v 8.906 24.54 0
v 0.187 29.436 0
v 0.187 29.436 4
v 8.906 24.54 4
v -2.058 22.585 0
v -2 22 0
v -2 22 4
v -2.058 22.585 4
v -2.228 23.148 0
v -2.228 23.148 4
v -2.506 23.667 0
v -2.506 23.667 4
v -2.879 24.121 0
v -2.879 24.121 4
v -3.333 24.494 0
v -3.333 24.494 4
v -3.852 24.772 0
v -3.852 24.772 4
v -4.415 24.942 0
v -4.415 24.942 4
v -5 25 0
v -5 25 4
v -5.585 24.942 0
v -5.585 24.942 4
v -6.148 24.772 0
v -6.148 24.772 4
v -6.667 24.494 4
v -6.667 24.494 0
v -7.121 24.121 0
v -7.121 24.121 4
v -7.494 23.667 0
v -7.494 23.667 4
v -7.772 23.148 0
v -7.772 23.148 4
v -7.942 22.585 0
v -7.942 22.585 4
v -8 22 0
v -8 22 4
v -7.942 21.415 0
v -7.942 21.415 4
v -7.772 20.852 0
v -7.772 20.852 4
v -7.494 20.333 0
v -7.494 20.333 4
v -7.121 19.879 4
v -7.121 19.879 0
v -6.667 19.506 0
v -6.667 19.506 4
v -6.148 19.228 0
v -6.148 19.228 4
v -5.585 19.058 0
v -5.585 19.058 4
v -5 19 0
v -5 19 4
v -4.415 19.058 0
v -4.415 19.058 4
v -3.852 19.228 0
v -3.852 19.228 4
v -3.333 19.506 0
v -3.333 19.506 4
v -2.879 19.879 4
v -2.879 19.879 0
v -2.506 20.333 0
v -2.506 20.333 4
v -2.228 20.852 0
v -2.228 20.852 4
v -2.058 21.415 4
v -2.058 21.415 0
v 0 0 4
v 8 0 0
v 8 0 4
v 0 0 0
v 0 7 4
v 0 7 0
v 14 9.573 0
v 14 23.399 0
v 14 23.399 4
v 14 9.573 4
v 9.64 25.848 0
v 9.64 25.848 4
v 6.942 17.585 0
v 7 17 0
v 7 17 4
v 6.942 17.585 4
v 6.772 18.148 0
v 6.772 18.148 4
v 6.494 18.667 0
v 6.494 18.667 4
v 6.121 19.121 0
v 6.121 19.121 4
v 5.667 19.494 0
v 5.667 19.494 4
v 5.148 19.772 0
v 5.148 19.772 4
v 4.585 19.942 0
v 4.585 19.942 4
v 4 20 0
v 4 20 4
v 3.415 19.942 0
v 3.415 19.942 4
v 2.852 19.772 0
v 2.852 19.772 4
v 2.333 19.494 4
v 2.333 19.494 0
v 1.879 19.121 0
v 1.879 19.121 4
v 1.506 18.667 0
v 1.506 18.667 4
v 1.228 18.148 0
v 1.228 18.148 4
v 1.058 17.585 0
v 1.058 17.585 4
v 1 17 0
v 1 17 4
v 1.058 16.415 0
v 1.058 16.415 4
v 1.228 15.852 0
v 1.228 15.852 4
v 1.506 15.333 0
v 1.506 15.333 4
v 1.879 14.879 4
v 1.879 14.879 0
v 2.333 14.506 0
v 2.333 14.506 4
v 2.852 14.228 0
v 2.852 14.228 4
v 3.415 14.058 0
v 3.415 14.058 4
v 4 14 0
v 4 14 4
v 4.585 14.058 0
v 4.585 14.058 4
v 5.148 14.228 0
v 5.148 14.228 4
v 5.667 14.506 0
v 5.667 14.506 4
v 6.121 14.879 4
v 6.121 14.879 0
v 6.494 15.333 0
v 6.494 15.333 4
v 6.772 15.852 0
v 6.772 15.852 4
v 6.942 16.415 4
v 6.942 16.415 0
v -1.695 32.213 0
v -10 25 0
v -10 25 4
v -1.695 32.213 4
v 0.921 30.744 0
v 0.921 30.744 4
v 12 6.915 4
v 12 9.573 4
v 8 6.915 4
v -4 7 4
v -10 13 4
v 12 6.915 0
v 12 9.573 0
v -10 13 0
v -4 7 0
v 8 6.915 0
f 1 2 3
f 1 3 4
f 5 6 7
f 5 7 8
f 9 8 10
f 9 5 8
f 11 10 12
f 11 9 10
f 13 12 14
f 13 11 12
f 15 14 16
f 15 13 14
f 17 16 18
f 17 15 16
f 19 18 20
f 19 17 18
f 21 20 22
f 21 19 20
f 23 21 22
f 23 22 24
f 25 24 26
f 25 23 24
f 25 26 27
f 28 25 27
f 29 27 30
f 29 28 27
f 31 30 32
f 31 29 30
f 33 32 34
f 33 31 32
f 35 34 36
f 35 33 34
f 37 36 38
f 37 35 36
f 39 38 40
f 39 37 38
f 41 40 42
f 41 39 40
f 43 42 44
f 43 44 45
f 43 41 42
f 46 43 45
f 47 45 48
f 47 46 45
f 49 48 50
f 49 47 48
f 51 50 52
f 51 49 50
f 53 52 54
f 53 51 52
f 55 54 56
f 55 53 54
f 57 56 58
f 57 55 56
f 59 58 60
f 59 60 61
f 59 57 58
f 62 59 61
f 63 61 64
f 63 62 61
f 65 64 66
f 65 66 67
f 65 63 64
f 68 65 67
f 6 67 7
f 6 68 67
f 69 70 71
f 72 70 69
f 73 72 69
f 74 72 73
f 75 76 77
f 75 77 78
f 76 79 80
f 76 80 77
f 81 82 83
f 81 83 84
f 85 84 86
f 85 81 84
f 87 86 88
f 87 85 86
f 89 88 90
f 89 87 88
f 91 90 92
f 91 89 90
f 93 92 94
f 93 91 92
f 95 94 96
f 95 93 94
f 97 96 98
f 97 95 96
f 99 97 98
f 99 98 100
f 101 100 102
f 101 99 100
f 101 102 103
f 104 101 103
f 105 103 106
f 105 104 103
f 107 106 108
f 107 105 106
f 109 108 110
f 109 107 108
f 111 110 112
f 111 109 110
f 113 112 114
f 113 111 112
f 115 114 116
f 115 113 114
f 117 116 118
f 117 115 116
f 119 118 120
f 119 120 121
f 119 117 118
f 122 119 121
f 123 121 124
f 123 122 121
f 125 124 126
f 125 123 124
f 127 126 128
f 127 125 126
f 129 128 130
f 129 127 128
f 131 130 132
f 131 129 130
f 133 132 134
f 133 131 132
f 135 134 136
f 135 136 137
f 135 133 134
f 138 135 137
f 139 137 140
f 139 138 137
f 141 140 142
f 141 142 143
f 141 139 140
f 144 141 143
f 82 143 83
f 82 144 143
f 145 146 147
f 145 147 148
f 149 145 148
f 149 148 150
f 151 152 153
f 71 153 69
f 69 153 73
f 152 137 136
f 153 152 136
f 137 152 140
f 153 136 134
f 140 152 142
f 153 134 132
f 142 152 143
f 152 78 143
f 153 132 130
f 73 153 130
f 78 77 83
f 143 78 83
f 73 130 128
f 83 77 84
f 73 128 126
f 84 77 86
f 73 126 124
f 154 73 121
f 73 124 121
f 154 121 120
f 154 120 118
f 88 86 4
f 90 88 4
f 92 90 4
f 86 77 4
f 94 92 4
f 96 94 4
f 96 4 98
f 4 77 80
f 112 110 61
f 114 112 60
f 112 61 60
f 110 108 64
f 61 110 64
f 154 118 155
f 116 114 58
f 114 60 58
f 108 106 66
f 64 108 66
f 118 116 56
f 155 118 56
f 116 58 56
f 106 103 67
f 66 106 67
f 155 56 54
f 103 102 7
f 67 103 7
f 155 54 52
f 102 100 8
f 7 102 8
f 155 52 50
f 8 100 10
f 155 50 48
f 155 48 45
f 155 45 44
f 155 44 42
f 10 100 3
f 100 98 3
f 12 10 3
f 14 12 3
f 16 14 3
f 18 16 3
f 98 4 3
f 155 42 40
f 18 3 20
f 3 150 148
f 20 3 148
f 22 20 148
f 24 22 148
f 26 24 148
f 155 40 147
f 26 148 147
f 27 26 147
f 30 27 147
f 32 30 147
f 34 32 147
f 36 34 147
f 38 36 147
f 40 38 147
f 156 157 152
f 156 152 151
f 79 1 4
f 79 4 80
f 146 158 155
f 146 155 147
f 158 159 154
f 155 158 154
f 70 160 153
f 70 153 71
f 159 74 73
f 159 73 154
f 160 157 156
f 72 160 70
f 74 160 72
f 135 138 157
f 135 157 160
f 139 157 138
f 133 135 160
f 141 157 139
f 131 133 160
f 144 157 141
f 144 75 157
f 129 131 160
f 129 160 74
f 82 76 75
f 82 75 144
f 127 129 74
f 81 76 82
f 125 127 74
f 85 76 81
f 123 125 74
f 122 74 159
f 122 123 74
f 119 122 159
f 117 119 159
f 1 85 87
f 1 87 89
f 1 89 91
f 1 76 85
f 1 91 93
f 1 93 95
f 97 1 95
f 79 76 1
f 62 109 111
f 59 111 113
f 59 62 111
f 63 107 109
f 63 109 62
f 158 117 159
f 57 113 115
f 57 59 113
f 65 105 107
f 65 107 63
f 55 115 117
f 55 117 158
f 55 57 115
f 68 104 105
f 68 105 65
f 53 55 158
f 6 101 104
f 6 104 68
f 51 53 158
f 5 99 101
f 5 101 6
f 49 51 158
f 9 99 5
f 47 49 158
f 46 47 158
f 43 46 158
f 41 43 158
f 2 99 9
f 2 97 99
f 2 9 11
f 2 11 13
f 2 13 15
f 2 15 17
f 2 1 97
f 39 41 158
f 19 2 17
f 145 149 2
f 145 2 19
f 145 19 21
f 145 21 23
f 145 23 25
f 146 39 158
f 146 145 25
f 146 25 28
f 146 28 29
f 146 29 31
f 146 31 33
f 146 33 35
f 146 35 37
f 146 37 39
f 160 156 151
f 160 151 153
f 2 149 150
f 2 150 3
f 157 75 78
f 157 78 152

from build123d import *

# Parameters (mm, degrees)
SKETCH_1_R      = 3
EXTRUDE_1_DEPTH = 4
CHAMFER_1_SIZE  = 6


with BuildPart() as part:
    # 草图1 → 凸台-拉伸1 (new body)
    with BuildSketch(Plane.XY):
        Polygon((-10, 25), (-1.694756853, 32.21269272), (0.921035956, 30.743806073), (0.186592632, 29.435909669), (8.905901995, 24.539620846), (9.640345319, 25.84751725), (14, 23.399372839), (14, 9.572691833), (12, 9.572691833), (12, 6.915051809), (8, 6.915051809), (8, 0), (0, 0), (0, 7), (-4, 7), (-4, 13), (-10, 13), align=None)
        with Locations((-5, 22)):
            Circle(SKETCH_1_R, mode=Mode.SUBTRACT)
        with Locations((4, 17)):
            Circle(SKETCH_1_R, mode=Mode.SUBTRACT)
    extrude(amount=EXTRUDE_1_DEPTH)

    # 倒角1
    chamfer_1_edges = [part.edges().sort_by_distance(p)[0] for p in [
        (-4, 13, 2),
    ]]
    chamfer(chamfer_1_edges, length=CHAMFER_1_SIZE - 0.0001)  # a hair under: the kernel refuses the full size


solid = part.part
